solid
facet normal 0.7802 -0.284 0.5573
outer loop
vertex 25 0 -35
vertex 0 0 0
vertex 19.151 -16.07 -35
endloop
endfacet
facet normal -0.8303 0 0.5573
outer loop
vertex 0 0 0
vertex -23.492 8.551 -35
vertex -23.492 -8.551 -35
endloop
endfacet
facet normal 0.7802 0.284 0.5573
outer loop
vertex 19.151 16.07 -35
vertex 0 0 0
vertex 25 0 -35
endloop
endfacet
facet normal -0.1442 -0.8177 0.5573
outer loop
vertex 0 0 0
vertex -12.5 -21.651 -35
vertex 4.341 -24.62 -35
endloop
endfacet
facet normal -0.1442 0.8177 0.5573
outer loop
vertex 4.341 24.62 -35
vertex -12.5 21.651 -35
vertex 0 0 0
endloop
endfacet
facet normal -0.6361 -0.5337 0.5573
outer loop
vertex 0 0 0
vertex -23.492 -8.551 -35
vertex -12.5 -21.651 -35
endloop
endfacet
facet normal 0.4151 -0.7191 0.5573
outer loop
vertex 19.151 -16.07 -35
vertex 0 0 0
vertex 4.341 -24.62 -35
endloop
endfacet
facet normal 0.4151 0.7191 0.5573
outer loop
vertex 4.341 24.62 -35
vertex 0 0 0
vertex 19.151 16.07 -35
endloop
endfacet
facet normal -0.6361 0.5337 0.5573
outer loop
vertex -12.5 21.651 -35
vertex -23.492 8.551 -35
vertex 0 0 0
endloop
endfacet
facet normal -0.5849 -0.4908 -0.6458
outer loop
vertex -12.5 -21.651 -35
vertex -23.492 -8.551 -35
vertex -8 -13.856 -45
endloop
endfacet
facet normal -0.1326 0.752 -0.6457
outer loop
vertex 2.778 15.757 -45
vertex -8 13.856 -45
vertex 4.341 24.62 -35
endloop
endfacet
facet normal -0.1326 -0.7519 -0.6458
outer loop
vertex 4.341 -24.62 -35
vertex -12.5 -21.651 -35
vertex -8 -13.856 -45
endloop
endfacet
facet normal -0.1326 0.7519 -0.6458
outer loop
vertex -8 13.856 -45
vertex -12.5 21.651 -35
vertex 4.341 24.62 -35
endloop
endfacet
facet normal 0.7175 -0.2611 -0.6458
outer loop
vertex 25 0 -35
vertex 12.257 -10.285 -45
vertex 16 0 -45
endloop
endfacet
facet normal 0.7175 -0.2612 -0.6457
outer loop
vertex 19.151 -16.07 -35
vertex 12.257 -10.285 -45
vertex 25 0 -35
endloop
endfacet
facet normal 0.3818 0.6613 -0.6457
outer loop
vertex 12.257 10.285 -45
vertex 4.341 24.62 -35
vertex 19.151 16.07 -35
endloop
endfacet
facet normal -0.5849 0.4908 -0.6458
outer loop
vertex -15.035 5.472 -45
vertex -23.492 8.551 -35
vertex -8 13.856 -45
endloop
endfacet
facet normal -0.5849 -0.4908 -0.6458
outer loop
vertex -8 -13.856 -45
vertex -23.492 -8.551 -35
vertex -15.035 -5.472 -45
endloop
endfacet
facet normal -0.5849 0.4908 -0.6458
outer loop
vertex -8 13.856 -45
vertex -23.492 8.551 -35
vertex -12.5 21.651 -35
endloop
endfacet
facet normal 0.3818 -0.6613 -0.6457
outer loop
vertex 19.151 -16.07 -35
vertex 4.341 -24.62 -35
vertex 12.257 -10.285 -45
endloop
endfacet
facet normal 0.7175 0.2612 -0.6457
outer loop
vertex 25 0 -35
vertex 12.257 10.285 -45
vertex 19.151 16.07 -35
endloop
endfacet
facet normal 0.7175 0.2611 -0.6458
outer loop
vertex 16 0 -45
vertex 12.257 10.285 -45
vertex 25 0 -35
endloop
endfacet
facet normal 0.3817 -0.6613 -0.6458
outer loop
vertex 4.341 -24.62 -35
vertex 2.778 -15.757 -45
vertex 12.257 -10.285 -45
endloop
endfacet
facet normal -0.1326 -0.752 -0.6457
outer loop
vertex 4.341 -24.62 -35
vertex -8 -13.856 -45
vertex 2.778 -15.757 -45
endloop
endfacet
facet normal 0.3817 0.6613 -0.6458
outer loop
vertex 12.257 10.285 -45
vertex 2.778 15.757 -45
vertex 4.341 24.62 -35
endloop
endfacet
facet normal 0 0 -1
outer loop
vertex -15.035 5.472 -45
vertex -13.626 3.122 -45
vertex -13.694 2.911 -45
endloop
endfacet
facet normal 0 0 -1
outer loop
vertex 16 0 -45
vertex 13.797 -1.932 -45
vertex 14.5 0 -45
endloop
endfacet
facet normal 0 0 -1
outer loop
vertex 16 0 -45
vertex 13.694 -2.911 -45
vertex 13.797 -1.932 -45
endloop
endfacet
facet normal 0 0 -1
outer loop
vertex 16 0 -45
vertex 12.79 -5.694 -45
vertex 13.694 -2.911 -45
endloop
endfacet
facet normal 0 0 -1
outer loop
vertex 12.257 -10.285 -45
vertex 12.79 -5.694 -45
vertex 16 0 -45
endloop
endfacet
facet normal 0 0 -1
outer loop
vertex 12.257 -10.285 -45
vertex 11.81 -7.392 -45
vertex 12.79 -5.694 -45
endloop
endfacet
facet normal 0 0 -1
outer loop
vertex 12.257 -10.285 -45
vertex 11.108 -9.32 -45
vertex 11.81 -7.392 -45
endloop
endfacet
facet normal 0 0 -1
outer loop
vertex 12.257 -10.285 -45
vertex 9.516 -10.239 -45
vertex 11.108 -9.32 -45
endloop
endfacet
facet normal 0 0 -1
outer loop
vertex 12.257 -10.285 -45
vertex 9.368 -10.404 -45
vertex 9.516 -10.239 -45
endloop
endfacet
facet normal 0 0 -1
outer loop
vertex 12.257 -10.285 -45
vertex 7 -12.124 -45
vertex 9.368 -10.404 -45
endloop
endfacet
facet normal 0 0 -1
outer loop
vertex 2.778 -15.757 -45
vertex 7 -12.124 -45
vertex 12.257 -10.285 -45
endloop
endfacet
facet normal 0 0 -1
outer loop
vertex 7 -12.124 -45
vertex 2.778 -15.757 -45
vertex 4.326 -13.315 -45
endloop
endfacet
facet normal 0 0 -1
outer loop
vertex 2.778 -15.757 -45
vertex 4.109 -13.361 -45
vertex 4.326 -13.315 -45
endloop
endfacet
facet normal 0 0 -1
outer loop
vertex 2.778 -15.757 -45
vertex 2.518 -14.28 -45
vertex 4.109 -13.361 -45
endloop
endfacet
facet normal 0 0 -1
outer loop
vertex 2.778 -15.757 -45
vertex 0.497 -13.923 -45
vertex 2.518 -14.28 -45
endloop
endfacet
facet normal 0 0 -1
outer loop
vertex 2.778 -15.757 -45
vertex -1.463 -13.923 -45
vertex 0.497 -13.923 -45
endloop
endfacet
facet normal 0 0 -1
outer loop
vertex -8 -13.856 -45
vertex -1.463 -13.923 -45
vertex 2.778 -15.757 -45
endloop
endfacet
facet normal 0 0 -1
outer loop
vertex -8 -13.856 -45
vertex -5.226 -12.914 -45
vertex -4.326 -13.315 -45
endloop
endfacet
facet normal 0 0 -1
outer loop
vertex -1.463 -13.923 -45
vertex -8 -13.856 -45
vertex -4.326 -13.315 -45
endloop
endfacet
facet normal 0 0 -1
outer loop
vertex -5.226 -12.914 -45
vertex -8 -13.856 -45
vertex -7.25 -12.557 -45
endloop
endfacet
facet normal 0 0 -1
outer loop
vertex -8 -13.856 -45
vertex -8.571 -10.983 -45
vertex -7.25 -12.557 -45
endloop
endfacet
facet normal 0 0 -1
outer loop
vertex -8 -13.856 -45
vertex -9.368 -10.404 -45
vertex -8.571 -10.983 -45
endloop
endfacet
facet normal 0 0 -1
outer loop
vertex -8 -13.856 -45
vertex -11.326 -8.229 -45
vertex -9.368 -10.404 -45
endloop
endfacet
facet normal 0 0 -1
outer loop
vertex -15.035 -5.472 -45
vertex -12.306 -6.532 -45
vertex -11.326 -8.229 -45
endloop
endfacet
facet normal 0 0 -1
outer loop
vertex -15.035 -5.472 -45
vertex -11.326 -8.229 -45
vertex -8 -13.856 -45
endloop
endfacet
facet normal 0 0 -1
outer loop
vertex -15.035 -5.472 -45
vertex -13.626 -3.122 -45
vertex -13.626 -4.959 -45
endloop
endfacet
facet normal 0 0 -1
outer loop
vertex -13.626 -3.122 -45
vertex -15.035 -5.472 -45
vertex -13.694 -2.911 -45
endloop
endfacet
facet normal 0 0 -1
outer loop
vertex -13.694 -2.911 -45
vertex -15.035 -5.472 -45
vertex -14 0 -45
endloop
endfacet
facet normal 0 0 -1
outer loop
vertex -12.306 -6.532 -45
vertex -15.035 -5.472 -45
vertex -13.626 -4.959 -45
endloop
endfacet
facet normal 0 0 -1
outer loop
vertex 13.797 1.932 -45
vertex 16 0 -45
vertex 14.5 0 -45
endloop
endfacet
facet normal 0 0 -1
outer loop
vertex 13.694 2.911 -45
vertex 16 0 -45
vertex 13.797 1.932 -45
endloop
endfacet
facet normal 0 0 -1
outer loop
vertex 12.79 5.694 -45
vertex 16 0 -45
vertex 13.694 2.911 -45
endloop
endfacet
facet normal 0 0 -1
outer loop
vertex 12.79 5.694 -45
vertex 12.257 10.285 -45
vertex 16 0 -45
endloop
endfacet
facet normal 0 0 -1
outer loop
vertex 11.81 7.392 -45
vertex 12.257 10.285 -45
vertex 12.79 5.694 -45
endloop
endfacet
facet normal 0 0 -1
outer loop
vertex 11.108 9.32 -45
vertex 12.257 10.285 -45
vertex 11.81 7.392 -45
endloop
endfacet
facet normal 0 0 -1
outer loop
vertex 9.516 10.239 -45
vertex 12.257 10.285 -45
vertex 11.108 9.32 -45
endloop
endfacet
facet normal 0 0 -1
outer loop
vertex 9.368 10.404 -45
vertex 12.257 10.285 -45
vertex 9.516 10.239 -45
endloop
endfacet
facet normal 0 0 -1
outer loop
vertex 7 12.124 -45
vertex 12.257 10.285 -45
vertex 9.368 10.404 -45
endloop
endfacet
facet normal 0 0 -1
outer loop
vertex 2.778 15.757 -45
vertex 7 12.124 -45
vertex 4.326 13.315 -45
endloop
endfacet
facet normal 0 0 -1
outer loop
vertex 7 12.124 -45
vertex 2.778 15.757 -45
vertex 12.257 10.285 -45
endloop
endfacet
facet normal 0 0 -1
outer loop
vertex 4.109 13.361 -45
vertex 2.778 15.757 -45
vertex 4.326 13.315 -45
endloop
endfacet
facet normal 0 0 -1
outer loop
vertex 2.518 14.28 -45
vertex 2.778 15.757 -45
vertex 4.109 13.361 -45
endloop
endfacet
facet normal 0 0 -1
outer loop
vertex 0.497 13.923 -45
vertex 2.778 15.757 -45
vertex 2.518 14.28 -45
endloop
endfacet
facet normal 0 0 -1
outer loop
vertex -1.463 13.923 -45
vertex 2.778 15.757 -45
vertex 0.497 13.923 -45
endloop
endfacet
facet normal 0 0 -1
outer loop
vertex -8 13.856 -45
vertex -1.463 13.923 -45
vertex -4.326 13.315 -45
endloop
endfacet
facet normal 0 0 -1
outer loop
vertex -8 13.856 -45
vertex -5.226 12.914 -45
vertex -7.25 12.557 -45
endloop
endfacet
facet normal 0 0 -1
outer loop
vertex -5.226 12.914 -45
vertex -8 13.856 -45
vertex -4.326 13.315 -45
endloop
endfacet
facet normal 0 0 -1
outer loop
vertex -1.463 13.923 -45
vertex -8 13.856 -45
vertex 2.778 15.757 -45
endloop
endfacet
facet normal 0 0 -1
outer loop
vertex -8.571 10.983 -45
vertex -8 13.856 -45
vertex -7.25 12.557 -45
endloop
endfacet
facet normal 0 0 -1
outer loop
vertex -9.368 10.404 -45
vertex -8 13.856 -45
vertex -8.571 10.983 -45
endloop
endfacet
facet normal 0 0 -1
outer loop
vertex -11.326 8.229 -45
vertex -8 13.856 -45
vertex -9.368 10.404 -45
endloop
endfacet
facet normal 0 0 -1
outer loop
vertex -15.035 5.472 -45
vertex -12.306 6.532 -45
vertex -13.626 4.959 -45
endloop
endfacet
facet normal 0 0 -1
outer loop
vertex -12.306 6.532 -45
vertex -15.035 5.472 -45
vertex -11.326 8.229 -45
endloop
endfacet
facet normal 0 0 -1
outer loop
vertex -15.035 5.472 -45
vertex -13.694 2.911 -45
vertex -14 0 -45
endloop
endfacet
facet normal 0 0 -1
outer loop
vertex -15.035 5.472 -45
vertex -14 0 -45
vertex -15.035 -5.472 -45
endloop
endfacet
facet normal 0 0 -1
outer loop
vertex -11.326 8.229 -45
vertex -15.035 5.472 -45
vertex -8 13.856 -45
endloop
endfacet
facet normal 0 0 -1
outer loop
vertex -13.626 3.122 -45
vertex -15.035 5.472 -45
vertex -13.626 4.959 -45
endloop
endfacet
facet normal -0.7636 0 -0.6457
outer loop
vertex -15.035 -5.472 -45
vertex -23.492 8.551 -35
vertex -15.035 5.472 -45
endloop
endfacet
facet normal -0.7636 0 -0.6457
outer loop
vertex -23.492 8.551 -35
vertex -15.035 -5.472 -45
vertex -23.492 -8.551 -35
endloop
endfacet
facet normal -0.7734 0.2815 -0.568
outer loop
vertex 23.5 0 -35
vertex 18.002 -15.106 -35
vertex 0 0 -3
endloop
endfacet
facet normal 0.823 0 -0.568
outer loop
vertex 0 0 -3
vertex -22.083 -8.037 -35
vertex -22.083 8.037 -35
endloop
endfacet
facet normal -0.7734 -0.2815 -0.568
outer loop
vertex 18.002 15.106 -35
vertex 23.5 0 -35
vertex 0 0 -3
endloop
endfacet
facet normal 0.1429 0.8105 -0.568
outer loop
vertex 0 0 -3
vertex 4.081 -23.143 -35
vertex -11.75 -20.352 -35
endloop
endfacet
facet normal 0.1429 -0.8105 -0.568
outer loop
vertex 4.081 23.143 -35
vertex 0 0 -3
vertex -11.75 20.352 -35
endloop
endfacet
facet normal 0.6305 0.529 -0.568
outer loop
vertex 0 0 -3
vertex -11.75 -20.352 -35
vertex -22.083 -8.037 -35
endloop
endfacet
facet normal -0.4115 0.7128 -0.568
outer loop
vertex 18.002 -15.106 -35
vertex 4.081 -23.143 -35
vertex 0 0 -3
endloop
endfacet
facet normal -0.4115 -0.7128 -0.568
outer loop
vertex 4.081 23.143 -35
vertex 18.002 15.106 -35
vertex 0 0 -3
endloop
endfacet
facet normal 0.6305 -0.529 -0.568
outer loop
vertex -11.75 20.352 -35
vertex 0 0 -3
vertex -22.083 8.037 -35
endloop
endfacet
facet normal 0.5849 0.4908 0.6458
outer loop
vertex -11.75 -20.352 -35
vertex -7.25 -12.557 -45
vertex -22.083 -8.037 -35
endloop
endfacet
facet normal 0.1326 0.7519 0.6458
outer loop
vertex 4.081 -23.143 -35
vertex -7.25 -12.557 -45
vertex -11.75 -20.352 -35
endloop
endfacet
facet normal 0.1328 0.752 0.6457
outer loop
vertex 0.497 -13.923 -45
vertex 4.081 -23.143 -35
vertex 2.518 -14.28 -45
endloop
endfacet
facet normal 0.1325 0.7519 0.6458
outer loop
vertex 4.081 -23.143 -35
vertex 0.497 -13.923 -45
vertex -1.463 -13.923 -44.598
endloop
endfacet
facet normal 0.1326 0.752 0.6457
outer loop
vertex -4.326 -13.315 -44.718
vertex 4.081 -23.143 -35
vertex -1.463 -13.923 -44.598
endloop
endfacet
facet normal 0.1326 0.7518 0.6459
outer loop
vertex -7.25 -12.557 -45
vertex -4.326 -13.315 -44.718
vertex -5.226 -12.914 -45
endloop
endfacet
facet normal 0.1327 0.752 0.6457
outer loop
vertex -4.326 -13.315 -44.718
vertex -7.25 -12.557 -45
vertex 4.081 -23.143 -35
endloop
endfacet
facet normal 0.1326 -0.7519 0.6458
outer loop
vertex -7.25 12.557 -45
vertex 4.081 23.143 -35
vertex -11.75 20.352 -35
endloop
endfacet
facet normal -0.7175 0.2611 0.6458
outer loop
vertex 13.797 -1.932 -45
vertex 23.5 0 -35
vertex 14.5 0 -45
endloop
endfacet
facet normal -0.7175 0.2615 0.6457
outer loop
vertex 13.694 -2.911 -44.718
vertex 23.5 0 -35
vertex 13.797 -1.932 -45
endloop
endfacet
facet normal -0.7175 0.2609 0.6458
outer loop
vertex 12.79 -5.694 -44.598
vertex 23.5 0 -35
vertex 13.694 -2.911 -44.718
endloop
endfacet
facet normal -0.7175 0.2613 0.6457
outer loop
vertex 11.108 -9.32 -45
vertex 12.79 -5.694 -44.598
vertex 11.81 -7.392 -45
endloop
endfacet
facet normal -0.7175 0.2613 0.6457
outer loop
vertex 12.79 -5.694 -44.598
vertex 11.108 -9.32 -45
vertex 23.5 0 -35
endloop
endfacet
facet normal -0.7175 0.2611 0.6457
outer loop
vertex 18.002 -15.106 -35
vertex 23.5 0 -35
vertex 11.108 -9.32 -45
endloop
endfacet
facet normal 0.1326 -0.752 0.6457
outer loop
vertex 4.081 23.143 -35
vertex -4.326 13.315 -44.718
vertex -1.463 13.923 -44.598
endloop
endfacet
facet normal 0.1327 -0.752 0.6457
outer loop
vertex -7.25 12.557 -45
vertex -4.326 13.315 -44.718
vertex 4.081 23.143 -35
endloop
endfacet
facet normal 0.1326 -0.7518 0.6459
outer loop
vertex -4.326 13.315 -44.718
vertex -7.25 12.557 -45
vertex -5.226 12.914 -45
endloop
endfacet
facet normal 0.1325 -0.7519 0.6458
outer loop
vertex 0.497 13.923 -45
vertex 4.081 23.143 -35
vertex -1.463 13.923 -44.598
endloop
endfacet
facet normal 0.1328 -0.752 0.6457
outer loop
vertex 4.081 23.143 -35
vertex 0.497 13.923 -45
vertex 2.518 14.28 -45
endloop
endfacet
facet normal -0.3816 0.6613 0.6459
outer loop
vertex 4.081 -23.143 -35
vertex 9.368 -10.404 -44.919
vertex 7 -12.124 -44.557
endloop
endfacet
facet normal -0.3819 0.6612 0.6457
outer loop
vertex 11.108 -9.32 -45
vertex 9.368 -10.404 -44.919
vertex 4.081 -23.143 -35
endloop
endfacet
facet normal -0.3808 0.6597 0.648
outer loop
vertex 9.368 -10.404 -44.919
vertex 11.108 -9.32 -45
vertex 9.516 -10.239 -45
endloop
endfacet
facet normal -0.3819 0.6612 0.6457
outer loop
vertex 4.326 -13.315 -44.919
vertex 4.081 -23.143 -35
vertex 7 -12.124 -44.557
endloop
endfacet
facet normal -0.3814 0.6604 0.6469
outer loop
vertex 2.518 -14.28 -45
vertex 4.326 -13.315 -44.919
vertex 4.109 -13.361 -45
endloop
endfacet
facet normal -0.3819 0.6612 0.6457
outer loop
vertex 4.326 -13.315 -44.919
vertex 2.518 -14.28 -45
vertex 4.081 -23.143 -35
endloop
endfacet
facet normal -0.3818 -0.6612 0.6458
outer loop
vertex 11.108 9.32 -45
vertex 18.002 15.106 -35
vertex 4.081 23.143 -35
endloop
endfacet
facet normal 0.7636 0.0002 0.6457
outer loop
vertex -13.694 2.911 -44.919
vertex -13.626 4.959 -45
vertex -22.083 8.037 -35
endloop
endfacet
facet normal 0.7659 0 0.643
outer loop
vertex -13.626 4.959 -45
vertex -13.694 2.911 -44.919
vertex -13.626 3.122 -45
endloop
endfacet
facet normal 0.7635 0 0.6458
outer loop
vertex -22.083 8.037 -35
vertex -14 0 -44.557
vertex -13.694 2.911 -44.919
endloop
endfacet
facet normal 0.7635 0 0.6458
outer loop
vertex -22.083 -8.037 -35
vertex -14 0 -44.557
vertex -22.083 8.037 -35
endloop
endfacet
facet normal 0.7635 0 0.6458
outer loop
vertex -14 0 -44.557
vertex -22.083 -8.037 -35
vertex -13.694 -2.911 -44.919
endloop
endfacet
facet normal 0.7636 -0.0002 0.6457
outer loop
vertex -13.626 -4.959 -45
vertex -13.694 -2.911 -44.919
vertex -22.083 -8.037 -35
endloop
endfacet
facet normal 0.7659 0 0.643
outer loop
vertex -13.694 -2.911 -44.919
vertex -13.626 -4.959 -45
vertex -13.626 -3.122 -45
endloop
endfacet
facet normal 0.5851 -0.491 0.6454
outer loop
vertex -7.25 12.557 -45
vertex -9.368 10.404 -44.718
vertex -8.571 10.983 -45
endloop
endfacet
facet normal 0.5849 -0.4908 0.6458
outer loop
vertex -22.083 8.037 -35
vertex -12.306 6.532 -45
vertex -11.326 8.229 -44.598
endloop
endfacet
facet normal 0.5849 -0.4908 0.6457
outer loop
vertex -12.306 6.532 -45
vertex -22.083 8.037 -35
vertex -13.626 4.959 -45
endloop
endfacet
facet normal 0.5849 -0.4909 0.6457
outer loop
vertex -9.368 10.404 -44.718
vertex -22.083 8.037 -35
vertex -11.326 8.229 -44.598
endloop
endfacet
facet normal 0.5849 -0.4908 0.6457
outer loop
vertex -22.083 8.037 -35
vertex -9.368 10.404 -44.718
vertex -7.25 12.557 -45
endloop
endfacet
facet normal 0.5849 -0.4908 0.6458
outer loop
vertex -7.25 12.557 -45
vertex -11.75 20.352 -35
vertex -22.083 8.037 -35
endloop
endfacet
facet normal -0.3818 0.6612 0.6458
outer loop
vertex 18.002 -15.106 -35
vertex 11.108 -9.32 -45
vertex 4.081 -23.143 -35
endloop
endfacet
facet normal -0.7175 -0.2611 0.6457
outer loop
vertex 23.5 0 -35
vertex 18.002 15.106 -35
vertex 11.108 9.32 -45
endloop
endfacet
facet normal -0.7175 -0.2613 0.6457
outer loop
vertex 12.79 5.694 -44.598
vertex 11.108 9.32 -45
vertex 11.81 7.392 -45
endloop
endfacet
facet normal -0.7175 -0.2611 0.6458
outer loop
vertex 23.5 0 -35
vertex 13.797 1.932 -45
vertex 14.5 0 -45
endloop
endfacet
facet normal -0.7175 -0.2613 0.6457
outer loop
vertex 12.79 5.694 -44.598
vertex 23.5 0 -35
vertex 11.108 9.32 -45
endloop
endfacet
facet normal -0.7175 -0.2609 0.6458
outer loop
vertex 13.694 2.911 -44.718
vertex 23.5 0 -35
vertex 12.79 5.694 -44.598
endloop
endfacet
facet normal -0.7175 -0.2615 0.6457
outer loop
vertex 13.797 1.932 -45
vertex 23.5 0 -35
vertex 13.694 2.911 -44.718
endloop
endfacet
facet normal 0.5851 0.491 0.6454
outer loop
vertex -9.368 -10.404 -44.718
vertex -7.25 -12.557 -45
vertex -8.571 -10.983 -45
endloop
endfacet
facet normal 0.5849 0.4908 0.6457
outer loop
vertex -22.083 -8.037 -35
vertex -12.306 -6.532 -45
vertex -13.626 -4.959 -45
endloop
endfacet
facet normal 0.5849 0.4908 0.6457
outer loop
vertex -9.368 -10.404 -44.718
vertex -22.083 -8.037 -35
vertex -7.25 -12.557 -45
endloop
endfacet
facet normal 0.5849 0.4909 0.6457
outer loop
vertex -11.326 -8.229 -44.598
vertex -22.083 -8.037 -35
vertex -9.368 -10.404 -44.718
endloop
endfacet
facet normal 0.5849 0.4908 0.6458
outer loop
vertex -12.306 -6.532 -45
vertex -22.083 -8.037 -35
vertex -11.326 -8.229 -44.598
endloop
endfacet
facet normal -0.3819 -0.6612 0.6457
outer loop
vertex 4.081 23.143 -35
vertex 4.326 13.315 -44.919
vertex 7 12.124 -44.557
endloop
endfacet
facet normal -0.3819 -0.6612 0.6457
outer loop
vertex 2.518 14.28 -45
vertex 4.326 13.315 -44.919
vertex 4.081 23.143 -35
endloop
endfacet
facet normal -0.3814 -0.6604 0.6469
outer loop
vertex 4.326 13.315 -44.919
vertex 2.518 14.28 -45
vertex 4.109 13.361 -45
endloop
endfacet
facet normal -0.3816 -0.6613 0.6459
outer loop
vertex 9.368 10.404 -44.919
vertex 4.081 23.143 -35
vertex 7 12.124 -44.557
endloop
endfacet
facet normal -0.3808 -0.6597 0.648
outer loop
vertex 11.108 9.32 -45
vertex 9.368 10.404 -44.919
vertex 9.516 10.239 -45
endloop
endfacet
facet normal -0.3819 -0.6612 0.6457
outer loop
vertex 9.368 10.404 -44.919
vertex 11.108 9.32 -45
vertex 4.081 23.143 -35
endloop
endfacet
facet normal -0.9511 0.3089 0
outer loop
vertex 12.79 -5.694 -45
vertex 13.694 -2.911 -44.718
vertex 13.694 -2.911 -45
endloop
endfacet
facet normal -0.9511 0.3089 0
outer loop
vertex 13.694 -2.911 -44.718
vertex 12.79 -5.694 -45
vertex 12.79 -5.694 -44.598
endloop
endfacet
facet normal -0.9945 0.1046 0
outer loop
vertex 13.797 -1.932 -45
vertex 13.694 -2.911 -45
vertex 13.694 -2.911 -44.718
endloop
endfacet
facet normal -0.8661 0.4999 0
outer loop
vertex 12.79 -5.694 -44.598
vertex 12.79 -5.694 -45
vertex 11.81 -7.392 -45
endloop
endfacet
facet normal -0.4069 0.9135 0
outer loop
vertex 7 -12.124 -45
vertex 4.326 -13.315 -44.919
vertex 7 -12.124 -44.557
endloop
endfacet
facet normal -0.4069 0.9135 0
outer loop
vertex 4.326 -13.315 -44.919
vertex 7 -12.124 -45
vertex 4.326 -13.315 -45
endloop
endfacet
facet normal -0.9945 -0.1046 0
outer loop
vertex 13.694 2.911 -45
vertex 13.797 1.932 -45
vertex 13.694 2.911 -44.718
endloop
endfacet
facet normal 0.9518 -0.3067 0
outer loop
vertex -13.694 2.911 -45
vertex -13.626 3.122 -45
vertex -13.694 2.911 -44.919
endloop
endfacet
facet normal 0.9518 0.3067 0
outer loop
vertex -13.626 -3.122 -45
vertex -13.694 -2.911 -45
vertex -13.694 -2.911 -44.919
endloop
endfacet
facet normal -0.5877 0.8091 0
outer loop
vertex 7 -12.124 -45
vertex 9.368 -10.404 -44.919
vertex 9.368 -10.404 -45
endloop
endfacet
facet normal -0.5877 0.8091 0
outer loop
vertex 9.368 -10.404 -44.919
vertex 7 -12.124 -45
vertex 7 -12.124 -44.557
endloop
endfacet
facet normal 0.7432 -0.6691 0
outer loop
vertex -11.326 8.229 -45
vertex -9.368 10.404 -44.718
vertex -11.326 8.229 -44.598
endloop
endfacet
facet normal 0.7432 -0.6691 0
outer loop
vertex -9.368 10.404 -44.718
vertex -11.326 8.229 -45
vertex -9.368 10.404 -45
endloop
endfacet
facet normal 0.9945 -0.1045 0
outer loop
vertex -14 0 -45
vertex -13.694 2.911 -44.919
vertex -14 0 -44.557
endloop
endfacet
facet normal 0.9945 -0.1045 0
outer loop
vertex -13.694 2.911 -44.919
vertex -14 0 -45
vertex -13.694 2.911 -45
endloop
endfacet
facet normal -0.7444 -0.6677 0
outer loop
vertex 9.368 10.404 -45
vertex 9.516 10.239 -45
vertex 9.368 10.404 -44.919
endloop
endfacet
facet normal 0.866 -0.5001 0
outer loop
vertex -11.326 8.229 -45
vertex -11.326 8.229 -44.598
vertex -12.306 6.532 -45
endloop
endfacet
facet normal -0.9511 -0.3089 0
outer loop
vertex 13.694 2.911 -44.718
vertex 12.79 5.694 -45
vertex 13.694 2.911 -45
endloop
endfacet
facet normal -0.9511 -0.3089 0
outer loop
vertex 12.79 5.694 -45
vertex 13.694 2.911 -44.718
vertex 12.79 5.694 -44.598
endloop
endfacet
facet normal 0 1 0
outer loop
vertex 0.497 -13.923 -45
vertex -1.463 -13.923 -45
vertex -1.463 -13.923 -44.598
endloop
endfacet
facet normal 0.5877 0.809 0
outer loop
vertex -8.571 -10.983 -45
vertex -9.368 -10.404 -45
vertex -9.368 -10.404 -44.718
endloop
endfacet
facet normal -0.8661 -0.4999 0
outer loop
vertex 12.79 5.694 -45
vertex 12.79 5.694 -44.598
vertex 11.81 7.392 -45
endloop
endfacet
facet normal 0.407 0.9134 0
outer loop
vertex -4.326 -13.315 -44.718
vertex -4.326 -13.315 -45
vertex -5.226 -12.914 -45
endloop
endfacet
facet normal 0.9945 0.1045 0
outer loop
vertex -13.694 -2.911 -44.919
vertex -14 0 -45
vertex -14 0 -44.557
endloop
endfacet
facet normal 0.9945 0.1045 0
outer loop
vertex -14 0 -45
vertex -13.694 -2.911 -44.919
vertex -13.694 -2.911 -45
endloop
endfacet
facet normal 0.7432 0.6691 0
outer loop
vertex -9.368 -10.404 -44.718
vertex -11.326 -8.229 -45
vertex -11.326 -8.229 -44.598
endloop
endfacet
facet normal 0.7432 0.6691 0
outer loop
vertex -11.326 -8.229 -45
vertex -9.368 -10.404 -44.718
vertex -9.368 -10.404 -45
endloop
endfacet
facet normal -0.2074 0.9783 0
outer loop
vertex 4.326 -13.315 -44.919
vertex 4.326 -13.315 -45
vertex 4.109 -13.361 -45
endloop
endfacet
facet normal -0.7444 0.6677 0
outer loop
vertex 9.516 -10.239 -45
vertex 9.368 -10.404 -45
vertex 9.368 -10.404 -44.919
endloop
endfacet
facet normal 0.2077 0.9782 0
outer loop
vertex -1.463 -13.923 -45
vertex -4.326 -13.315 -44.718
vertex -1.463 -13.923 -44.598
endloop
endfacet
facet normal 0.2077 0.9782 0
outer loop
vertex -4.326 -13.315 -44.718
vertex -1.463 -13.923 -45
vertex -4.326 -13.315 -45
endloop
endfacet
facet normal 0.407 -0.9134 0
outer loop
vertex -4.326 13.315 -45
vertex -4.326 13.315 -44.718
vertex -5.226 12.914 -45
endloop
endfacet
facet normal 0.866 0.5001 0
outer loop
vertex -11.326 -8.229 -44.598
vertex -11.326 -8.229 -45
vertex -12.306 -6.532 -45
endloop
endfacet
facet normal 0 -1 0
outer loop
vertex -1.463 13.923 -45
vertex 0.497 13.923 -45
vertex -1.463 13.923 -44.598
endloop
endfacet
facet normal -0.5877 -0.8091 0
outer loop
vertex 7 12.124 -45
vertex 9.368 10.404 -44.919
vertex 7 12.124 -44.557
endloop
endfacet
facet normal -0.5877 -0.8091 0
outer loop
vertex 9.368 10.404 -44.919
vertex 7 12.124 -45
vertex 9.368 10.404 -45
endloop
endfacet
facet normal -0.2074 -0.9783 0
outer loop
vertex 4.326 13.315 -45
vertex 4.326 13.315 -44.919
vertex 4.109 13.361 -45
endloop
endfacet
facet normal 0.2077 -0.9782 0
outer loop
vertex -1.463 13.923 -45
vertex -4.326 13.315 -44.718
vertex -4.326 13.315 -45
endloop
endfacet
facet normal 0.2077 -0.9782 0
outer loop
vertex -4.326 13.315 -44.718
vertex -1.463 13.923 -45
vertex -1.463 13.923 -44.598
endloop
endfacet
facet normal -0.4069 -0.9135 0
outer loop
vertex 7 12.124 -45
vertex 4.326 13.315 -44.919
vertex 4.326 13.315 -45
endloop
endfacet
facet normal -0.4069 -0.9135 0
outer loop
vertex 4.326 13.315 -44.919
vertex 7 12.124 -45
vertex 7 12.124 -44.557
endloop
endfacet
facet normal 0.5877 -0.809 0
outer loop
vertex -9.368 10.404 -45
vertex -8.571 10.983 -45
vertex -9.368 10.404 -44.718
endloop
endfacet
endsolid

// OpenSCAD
// Width of the wider part.
width1 = 50;
// Width of the opening.
width2 = 32;
// Distance from the point to the widest part.
height1 = 35;
// Distance from the widest part to the opening.
height2 = 10;
// Number of sides/points.
sides = 9; // [3:15]


module diamond(w, w2, h1, h2) {
    $fn=sides;
    cylinder(d1=0, d2=w, h=h1);
    translate([0, 0, h1]) cylinder(d1=w, d2=w2, h=h2);
}

module dvase(w, w2, h1, h2) {
    difference() {
            diamond(w, w2, h1, h2);
            translate([0, 0, 3]) diamond(w-3, w2-3, h1-3, h2);
            translate([0, 0, h1-.1]) cylinder(d=w2-4, h=h2+1);
    }
}

rotate([180, 0, 0]) dvase(width1, width2, height1, height2);
